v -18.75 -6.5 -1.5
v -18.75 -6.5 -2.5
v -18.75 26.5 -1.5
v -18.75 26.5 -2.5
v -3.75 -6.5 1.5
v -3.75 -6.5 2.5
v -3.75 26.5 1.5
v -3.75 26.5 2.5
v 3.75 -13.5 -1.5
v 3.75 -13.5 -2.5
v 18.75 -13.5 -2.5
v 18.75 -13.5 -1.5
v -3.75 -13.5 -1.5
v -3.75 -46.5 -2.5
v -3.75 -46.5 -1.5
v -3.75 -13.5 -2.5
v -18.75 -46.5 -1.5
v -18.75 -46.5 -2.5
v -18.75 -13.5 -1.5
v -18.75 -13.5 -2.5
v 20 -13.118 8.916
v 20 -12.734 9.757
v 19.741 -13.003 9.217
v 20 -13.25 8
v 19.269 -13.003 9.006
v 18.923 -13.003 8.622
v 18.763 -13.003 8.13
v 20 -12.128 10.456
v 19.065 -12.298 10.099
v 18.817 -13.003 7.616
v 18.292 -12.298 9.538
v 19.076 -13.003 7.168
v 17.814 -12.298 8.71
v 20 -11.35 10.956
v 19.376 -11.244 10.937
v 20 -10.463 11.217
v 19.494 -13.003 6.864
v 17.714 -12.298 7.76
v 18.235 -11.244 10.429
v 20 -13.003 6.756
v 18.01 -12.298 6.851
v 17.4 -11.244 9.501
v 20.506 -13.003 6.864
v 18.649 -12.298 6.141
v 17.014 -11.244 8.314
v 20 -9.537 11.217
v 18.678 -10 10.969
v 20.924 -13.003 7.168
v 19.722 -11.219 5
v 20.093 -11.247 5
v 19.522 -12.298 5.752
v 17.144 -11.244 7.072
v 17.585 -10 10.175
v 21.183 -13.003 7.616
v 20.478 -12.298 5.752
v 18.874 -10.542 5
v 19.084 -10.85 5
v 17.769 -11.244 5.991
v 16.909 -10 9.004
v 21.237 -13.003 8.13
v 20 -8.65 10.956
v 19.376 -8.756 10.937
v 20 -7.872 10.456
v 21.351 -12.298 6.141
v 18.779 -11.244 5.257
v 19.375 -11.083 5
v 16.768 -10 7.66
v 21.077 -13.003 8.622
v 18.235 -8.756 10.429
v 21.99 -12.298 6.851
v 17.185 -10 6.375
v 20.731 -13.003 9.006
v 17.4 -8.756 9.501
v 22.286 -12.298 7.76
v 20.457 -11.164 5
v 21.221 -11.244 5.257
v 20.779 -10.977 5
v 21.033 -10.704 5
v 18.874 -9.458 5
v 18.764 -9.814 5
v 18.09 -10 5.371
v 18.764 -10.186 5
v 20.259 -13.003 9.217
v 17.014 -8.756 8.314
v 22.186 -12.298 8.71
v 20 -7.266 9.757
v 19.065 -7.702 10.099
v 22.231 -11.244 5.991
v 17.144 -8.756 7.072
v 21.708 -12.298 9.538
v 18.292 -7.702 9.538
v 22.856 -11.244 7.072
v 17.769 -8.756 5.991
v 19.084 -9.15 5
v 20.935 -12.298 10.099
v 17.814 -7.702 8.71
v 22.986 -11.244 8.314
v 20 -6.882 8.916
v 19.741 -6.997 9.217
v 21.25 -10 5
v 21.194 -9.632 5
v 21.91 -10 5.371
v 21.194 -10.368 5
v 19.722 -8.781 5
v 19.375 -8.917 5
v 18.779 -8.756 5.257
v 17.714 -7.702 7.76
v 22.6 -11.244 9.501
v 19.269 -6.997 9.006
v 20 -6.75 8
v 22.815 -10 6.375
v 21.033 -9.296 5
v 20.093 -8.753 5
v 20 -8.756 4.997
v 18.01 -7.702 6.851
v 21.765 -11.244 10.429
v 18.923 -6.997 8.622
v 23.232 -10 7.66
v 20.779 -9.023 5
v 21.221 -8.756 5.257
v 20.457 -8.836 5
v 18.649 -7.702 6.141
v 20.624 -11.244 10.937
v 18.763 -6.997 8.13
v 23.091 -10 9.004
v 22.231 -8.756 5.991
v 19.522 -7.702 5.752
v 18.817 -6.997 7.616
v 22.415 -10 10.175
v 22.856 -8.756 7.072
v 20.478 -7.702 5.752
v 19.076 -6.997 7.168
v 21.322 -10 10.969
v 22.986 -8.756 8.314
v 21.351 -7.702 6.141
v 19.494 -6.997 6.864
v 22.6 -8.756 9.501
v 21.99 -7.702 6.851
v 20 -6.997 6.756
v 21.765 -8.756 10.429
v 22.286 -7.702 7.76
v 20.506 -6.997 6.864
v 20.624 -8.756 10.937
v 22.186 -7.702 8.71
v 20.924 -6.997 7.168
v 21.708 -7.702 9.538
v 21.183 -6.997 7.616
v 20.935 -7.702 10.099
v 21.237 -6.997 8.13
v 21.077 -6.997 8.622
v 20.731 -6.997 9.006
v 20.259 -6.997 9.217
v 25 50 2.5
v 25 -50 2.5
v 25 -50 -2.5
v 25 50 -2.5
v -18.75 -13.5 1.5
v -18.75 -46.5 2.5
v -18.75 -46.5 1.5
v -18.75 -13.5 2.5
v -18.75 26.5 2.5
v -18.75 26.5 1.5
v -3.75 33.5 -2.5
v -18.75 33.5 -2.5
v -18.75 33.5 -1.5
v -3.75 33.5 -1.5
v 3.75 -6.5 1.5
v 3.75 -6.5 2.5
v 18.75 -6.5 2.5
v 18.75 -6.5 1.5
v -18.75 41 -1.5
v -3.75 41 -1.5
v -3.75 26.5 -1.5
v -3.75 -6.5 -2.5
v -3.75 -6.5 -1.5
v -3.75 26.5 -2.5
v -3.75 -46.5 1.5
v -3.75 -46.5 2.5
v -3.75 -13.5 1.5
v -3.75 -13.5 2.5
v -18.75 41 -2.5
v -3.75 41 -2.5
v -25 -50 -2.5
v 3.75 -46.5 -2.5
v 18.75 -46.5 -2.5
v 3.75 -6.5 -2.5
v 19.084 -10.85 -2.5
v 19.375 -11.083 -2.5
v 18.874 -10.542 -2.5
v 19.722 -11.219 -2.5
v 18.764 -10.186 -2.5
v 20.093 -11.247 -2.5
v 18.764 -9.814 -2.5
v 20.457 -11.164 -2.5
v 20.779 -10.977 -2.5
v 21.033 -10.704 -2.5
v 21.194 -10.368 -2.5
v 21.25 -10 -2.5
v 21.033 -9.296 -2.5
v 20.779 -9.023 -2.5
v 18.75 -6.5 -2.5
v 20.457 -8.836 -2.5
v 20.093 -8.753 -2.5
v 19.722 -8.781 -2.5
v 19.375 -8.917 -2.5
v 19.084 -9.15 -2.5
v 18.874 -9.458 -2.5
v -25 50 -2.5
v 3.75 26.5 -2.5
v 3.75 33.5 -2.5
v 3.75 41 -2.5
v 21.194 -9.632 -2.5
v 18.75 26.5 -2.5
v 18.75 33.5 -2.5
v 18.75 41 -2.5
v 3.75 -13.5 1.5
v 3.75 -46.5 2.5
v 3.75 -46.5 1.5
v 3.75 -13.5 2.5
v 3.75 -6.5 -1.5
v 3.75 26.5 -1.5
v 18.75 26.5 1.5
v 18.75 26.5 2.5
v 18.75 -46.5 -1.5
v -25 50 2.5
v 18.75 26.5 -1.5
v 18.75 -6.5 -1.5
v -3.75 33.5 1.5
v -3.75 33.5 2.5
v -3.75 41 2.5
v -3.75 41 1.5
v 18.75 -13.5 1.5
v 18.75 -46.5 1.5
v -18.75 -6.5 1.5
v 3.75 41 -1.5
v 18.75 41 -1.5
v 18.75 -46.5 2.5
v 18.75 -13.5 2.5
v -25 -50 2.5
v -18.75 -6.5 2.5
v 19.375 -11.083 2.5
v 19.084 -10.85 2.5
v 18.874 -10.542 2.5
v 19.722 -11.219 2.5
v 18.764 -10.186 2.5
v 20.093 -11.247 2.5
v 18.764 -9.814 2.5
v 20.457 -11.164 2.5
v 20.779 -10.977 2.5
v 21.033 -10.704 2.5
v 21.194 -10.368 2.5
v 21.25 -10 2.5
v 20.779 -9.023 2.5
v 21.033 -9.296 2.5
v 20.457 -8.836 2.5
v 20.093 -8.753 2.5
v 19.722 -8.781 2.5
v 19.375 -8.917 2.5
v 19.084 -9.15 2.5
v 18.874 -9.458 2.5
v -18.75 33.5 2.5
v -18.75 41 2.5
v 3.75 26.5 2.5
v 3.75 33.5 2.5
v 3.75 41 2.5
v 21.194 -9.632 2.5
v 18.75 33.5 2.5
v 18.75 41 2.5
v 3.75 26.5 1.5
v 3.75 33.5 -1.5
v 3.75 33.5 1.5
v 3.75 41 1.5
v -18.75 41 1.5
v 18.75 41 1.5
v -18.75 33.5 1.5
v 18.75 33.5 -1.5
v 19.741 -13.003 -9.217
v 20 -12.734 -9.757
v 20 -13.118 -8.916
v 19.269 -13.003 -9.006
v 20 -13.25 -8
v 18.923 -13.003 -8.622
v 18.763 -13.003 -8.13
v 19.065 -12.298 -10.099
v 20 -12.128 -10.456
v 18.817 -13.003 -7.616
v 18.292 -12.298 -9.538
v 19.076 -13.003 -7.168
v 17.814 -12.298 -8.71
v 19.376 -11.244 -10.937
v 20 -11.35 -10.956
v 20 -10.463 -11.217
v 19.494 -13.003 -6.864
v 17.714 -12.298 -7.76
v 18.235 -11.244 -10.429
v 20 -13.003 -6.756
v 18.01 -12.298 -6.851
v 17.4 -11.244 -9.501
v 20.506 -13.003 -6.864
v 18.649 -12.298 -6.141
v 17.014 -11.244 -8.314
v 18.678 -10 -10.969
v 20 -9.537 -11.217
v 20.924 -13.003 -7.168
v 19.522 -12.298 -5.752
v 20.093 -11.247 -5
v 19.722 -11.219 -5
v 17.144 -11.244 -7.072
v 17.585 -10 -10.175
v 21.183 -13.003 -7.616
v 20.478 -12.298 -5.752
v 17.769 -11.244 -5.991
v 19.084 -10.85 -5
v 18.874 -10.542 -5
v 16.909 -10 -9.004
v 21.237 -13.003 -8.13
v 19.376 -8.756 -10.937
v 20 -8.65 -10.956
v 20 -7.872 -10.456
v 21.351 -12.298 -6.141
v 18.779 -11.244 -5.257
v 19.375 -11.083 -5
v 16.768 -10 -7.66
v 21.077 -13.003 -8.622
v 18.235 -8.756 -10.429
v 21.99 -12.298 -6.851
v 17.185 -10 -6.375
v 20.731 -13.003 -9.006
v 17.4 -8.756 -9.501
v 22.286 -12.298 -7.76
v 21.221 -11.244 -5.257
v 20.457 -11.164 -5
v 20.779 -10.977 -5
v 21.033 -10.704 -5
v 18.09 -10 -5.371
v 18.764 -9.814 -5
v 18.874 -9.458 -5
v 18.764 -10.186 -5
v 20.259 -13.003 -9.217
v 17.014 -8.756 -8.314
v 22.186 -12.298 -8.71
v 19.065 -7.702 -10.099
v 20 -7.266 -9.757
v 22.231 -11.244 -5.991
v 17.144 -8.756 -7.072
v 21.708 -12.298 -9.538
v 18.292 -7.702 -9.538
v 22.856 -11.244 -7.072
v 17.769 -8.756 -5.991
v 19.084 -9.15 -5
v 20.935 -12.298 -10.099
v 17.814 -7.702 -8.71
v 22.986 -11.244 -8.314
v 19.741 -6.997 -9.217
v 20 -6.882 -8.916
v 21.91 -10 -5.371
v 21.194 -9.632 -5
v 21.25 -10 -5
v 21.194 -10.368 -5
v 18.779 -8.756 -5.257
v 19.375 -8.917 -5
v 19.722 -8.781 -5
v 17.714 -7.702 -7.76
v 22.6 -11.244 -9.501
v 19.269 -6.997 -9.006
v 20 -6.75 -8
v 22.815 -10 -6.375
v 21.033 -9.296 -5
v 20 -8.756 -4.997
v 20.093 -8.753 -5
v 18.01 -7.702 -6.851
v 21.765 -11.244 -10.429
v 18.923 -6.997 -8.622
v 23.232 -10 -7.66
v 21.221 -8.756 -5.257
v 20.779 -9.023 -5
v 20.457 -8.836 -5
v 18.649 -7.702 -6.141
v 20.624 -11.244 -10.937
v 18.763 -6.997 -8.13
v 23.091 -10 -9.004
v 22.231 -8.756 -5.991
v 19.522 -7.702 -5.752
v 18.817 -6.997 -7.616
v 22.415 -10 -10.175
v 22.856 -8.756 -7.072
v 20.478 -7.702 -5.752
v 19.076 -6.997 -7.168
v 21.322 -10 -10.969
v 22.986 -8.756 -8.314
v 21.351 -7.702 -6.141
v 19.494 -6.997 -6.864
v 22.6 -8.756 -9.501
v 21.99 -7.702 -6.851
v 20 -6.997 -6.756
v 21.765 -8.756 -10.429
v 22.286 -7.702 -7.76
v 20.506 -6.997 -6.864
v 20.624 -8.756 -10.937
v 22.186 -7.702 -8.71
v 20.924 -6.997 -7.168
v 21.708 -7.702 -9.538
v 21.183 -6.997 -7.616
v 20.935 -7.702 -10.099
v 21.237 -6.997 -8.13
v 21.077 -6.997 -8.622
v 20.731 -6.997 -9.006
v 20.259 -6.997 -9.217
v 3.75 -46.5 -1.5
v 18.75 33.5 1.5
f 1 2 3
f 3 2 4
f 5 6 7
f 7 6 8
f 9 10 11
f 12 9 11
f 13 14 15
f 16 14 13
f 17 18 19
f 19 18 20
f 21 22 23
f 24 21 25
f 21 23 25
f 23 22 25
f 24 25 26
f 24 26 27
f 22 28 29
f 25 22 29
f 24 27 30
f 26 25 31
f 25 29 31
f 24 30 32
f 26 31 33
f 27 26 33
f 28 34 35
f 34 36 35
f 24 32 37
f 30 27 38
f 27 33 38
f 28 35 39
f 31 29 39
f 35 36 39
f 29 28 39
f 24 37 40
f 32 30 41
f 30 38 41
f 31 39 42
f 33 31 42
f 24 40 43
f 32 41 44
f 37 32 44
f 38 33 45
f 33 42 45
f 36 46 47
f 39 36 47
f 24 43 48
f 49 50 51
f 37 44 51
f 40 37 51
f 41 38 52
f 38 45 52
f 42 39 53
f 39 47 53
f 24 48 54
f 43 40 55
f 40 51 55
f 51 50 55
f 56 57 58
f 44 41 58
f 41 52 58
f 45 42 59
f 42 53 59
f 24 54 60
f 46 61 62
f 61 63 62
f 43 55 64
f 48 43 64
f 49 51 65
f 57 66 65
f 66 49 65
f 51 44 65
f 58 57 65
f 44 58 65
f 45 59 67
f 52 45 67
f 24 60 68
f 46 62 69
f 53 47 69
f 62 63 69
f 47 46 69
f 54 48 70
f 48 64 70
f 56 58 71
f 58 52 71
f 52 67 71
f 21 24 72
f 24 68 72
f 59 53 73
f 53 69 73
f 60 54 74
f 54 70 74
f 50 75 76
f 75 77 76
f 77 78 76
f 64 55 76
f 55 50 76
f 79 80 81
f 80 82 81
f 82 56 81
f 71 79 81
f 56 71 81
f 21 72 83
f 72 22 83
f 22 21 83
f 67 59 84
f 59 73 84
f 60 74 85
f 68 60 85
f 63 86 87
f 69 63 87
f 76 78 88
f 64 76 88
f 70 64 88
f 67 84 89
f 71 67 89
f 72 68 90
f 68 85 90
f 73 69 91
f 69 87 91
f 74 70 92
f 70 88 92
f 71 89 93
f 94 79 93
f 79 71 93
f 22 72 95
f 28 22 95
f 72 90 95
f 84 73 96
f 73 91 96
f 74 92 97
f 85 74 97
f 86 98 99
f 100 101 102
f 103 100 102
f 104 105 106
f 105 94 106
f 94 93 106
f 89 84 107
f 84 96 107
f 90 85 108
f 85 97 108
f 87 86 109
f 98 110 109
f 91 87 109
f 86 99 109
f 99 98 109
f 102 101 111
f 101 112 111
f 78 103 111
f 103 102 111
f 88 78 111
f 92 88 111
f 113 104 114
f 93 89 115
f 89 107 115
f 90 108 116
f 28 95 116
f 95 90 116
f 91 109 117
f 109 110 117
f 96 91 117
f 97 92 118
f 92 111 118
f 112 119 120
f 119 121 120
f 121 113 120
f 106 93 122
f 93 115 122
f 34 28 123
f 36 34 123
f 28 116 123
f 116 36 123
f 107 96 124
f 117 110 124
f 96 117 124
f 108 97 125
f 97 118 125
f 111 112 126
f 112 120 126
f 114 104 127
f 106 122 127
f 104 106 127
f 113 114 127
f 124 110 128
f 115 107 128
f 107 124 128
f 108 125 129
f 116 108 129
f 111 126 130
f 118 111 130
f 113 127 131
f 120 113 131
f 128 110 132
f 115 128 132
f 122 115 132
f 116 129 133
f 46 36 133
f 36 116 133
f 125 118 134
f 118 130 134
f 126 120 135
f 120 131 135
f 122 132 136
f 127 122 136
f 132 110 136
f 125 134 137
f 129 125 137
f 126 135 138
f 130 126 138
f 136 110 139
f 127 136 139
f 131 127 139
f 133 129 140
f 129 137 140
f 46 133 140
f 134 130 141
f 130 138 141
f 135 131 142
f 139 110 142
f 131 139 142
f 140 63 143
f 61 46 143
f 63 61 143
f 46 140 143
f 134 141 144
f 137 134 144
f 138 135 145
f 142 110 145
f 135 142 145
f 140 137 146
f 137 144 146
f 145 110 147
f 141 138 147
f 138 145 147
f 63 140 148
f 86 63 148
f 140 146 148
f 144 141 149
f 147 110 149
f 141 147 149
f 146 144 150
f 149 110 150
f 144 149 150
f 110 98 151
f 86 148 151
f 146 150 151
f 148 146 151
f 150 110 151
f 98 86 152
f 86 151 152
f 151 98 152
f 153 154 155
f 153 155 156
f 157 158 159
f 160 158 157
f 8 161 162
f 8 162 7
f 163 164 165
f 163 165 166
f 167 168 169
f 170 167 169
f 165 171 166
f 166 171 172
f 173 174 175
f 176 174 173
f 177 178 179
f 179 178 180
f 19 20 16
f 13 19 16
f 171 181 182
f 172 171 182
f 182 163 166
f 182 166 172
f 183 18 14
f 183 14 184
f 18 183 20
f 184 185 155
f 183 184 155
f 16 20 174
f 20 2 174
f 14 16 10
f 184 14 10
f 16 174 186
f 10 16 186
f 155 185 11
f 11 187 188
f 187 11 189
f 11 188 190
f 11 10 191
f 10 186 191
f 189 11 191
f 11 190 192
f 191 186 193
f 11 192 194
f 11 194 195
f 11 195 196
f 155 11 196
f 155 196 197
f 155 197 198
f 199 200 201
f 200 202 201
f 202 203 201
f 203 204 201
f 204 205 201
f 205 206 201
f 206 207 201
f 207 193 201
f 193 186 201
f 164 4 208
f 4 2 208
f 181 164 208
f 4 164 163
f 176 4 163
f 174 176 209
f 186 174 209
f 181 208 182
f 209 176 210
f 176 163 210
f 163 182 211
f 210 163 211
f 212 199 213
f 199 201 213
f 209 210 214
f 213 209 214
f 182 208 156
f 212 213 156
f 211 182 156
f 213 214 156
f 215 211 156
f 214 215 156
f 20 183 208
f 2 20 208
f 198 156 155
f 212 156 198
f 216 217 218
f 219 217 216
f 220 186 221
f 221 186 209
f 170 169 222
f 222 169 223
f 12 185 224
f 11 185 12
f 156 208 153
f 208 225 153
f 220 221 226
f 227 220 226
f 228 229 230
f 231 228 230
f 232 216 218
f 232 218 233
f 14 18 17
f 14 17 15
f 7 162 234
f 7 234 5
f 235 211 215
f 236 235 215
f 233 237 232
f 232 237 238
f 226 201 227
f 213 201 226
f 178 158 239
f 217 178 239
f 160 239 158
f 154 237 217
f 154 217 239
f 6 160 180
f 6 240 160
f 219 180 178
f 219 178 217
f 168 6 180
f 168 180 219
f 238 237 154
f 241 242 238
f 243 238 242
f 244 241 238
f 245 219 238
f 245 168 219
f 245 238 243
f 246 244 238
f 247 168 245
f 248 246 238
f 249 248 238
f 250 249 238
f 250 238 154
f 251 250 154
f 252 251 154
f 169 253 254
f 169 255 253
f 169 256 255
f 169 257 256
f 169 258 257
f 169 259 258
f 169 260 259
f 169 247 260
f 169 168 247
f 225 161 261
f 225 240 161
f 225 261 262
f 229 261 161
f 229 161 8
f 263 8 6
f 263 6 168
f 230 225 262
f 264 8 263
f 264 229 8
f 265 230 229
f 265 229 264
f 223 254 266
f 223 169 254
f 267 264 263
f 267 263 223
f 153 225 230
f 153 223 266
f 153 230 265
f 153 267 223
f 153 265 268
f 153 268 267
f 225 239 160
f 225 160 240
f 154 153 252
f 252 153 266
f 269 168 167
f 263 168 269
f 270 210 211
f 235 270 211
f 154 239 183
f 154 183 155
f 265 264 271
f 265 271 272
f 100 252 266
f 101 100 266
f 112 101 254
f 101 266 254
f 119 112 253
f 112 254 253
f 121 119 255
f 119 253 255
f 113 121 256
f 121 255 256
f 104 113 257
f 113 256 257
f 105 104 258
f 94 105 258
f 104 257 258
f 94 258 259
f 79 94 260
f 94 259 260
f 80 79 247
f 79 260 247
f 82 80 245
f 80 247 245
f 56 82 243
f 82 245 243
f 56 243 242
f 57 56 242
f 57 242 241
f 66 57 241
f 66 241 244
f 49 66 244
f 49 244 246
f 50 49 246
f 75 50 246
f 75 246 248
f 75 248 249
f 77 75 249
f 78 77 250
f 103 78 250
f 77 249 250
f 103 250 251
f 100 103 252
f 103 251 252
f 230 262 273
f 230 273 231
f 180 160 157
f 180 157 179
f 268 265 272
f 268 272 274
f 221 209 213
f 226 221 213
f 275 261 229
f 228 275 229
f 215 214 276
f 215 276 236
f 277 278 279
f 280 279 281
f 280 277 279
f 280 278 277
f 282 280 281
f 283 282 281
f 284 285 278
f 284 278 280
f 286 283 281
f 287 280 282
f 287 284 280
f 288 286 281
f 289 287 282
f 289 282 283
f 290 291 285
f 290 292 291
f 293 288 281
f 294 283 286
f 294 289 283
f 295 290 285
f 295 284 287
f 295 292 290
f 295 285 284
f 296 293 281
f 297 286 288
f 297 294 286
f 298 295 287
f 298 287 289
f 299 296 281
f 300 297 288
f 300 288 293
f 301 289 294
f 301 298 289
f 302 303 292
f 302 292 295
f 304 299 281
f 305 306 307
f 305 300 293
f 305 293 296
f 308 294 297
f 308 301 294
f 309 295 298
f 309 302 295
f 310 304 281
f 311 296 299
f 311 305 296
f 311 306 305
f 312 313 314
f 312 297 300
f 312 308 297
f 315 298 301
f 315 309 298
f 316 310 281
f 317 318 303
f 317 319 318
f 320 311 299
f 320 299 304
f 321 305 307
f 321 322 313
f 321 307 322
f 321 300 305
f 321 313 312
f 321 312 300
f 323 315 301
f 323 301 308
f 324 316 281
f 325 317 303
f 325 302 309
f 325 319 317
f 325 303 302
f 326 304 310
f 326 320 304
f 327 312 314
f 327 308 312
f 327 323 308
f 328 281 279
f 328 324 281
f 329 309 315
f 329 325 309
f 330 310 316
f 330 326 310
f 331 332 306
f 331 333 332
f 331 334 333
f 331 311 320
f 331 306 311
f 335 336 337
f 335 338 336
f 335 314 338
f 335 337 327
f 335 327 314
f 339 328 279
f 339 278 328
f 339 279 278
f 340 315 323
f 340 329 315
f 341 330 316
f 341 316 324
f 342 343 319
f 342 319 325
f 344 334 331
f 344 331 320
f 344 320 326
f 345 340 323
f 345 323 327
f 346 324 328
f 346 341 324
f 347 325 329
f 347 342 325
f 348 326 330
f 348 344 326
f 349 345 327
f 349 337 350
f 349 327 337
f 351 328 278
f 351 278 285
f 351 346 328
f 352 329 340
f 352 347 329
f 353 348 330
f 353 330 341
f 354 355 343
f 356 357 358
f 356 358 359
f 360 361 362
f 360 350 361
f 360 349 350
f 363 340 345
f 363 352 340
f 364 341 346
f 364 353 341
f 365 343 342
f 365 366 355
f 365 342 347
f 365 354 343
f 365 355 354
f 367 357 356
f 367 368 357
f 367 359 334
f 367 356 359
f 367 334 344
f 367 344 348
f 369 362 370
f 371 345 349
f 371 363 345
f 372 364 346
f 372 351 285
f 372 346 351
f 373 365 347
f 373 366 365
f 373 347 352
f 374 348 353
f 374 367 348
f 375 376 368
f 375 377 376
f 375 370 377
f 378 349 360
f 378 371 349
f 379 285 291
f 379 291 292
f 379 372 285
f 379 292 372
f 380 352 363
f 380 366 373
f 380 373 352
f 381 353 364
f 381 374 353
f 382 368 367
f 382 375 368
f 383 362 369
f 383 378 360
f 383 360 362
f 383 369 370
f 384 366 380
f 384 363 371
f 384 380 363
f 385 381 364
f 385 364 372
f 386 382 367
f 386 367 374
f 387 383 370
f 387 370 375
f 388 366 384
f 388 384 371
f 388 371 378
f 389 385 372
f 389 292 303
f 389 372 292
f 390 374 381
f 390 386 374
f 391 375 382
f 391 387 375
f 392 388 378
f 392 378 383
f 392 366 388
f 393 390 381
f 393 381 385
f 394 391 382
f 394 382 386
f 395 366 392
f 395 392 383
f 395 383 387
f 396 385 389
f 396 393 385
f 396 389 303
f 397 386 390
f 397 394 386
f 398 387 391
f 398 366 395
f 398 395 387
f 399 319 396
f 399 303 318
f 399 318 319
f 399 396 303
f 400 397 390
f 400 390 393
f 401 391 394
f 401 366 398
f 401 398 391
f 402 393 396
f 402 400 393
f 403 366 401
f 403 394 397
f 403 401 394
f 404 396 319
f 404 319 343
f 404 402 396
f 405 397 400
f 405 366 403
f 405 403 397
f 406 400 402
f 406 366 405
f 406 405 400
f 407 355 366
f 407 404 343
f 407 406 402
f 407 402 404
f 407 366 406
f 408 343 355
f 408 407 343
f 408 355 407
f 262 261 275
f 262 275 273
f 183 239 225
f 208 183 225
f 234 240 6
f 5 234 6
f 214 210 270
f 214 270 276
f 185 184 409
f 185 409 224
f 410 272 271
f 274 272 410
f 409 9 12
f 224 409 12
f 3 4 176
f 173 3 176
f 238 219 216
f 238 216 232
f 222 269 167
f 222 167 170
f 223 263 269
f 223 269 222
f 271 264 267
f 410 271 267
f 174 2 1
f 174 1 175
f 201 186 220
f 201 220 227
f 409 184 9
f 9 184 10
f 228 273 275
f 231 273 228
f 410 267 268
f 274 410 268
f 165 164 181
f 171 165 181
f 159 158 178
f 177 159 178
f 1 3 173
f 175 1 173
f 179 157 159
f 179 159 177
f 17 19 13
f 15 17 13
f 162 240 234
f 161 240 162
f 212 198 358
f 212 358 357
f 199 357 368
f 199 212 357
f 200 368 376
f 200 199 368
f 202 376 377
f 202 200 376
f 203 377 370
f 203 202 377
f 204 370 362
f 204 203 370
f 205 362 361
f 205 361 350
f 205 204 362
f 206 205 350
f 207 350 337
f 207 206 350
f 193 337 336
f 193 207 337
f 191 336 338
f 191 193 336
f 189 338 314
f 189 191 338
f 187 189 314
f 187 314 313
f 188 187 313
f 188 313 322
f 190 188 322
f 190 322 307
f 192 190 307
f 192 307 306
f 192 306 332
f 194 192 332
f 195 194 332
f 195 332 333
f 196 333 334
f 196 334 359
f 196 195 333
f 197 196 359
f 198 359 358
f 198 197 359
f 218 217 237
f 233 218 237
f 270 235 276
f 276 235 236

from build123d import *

# Parameters (mm, degrees)
SKETCH1_W           = 50
SKETCH1_H           = 100
BOSS_EXTRUDE1_DEPTH = 2.5
SKETCH2_R           = 1.25
BOSS_EXTRUDE2_DEPTH = 2.5
SKETCH4_W           = 15
SKETCH4_H           = 7.5
SKETCH4_H_2         = 33
CUT_EXTRUDE1_DEPTH  = 1


with BuildPart() as part:
    # Sketch1 → Boss-Extrude1 (new body, symmetric)
    with BuildSketch(Plane.XY):
        Rectangle(SKETCH1_W, SKETCH1_H)
    extrude(amount=BOSS_EXTRUDE1_DEPTH, both=True)

    # Sketch2 → Boss-Extrude2 (add)
    with BuildSketch(Plane.XY.offset(2.5)):
        with Locations((20, -10)):
            Circle(SKETCH2_R)
    boss_extrude2 = extrude(amount=BOSS_EXTRUDE2_DEPTH)

    # Sketch3 → Revolve1 (revolve)
    with BuildSketch(Plane(origin=(20, 0, 0), x_dir=(0, 0, -1), z_dir=(1, 0, 0))):
        with BuildLine():
            Line((-8, -6.75), (-8, -13.25))
            ThreePointArc((-8, -13.25), (-11.25, -10), (-8, -6.75))
        make_face()
    revolve1 = revolve(axis=Axis((20, -6.75, 8), (0, -1, 0)))

    # Sketch4 → Cut-Extrude1 (cut)
    with BuildSketch(Plane.XY.offset(2.5)):
        with Locations((-11.25, 37.25)):
            Rectangle(SKETCH4_W, SKETCH4_H)
        with Locations((11.25, 37.25)):
            Rectangle(SKETCH4_W, SKETCH4_H)
        with Locations((11.25, 10)):
            Rectangle(SKETCH4_W, SKETCH4_H_2)
        with Locations((-11.25, 10)):
            Rectangle(SKETCH4_W, SKETCH4_H_2)
        with Locations((-11.25, -30)):
            Rectangle(SKETCH4_W, SKETCH4_H_2)
        with Locations((11.25, -30)):
            Rectangle(SKETCH4_W, SKETCH4_H_2)
    cut_extrude1 = extrude(amount=-CUT_EXTRUDE1_DEPTH, mode=Mode.SUBTRACT)

    # Mirror1: Boss-Extrude2, Revolve1, Cut-Extrude1 across plane
    add(boss_extrude2.mirror(Plane.XY))
    add(revolve1.mirror(Plane.XY))
    add(cut_extrude1.mirror(Plane.XY), mode=Mode.SUBTRACT)


solid = part.part
